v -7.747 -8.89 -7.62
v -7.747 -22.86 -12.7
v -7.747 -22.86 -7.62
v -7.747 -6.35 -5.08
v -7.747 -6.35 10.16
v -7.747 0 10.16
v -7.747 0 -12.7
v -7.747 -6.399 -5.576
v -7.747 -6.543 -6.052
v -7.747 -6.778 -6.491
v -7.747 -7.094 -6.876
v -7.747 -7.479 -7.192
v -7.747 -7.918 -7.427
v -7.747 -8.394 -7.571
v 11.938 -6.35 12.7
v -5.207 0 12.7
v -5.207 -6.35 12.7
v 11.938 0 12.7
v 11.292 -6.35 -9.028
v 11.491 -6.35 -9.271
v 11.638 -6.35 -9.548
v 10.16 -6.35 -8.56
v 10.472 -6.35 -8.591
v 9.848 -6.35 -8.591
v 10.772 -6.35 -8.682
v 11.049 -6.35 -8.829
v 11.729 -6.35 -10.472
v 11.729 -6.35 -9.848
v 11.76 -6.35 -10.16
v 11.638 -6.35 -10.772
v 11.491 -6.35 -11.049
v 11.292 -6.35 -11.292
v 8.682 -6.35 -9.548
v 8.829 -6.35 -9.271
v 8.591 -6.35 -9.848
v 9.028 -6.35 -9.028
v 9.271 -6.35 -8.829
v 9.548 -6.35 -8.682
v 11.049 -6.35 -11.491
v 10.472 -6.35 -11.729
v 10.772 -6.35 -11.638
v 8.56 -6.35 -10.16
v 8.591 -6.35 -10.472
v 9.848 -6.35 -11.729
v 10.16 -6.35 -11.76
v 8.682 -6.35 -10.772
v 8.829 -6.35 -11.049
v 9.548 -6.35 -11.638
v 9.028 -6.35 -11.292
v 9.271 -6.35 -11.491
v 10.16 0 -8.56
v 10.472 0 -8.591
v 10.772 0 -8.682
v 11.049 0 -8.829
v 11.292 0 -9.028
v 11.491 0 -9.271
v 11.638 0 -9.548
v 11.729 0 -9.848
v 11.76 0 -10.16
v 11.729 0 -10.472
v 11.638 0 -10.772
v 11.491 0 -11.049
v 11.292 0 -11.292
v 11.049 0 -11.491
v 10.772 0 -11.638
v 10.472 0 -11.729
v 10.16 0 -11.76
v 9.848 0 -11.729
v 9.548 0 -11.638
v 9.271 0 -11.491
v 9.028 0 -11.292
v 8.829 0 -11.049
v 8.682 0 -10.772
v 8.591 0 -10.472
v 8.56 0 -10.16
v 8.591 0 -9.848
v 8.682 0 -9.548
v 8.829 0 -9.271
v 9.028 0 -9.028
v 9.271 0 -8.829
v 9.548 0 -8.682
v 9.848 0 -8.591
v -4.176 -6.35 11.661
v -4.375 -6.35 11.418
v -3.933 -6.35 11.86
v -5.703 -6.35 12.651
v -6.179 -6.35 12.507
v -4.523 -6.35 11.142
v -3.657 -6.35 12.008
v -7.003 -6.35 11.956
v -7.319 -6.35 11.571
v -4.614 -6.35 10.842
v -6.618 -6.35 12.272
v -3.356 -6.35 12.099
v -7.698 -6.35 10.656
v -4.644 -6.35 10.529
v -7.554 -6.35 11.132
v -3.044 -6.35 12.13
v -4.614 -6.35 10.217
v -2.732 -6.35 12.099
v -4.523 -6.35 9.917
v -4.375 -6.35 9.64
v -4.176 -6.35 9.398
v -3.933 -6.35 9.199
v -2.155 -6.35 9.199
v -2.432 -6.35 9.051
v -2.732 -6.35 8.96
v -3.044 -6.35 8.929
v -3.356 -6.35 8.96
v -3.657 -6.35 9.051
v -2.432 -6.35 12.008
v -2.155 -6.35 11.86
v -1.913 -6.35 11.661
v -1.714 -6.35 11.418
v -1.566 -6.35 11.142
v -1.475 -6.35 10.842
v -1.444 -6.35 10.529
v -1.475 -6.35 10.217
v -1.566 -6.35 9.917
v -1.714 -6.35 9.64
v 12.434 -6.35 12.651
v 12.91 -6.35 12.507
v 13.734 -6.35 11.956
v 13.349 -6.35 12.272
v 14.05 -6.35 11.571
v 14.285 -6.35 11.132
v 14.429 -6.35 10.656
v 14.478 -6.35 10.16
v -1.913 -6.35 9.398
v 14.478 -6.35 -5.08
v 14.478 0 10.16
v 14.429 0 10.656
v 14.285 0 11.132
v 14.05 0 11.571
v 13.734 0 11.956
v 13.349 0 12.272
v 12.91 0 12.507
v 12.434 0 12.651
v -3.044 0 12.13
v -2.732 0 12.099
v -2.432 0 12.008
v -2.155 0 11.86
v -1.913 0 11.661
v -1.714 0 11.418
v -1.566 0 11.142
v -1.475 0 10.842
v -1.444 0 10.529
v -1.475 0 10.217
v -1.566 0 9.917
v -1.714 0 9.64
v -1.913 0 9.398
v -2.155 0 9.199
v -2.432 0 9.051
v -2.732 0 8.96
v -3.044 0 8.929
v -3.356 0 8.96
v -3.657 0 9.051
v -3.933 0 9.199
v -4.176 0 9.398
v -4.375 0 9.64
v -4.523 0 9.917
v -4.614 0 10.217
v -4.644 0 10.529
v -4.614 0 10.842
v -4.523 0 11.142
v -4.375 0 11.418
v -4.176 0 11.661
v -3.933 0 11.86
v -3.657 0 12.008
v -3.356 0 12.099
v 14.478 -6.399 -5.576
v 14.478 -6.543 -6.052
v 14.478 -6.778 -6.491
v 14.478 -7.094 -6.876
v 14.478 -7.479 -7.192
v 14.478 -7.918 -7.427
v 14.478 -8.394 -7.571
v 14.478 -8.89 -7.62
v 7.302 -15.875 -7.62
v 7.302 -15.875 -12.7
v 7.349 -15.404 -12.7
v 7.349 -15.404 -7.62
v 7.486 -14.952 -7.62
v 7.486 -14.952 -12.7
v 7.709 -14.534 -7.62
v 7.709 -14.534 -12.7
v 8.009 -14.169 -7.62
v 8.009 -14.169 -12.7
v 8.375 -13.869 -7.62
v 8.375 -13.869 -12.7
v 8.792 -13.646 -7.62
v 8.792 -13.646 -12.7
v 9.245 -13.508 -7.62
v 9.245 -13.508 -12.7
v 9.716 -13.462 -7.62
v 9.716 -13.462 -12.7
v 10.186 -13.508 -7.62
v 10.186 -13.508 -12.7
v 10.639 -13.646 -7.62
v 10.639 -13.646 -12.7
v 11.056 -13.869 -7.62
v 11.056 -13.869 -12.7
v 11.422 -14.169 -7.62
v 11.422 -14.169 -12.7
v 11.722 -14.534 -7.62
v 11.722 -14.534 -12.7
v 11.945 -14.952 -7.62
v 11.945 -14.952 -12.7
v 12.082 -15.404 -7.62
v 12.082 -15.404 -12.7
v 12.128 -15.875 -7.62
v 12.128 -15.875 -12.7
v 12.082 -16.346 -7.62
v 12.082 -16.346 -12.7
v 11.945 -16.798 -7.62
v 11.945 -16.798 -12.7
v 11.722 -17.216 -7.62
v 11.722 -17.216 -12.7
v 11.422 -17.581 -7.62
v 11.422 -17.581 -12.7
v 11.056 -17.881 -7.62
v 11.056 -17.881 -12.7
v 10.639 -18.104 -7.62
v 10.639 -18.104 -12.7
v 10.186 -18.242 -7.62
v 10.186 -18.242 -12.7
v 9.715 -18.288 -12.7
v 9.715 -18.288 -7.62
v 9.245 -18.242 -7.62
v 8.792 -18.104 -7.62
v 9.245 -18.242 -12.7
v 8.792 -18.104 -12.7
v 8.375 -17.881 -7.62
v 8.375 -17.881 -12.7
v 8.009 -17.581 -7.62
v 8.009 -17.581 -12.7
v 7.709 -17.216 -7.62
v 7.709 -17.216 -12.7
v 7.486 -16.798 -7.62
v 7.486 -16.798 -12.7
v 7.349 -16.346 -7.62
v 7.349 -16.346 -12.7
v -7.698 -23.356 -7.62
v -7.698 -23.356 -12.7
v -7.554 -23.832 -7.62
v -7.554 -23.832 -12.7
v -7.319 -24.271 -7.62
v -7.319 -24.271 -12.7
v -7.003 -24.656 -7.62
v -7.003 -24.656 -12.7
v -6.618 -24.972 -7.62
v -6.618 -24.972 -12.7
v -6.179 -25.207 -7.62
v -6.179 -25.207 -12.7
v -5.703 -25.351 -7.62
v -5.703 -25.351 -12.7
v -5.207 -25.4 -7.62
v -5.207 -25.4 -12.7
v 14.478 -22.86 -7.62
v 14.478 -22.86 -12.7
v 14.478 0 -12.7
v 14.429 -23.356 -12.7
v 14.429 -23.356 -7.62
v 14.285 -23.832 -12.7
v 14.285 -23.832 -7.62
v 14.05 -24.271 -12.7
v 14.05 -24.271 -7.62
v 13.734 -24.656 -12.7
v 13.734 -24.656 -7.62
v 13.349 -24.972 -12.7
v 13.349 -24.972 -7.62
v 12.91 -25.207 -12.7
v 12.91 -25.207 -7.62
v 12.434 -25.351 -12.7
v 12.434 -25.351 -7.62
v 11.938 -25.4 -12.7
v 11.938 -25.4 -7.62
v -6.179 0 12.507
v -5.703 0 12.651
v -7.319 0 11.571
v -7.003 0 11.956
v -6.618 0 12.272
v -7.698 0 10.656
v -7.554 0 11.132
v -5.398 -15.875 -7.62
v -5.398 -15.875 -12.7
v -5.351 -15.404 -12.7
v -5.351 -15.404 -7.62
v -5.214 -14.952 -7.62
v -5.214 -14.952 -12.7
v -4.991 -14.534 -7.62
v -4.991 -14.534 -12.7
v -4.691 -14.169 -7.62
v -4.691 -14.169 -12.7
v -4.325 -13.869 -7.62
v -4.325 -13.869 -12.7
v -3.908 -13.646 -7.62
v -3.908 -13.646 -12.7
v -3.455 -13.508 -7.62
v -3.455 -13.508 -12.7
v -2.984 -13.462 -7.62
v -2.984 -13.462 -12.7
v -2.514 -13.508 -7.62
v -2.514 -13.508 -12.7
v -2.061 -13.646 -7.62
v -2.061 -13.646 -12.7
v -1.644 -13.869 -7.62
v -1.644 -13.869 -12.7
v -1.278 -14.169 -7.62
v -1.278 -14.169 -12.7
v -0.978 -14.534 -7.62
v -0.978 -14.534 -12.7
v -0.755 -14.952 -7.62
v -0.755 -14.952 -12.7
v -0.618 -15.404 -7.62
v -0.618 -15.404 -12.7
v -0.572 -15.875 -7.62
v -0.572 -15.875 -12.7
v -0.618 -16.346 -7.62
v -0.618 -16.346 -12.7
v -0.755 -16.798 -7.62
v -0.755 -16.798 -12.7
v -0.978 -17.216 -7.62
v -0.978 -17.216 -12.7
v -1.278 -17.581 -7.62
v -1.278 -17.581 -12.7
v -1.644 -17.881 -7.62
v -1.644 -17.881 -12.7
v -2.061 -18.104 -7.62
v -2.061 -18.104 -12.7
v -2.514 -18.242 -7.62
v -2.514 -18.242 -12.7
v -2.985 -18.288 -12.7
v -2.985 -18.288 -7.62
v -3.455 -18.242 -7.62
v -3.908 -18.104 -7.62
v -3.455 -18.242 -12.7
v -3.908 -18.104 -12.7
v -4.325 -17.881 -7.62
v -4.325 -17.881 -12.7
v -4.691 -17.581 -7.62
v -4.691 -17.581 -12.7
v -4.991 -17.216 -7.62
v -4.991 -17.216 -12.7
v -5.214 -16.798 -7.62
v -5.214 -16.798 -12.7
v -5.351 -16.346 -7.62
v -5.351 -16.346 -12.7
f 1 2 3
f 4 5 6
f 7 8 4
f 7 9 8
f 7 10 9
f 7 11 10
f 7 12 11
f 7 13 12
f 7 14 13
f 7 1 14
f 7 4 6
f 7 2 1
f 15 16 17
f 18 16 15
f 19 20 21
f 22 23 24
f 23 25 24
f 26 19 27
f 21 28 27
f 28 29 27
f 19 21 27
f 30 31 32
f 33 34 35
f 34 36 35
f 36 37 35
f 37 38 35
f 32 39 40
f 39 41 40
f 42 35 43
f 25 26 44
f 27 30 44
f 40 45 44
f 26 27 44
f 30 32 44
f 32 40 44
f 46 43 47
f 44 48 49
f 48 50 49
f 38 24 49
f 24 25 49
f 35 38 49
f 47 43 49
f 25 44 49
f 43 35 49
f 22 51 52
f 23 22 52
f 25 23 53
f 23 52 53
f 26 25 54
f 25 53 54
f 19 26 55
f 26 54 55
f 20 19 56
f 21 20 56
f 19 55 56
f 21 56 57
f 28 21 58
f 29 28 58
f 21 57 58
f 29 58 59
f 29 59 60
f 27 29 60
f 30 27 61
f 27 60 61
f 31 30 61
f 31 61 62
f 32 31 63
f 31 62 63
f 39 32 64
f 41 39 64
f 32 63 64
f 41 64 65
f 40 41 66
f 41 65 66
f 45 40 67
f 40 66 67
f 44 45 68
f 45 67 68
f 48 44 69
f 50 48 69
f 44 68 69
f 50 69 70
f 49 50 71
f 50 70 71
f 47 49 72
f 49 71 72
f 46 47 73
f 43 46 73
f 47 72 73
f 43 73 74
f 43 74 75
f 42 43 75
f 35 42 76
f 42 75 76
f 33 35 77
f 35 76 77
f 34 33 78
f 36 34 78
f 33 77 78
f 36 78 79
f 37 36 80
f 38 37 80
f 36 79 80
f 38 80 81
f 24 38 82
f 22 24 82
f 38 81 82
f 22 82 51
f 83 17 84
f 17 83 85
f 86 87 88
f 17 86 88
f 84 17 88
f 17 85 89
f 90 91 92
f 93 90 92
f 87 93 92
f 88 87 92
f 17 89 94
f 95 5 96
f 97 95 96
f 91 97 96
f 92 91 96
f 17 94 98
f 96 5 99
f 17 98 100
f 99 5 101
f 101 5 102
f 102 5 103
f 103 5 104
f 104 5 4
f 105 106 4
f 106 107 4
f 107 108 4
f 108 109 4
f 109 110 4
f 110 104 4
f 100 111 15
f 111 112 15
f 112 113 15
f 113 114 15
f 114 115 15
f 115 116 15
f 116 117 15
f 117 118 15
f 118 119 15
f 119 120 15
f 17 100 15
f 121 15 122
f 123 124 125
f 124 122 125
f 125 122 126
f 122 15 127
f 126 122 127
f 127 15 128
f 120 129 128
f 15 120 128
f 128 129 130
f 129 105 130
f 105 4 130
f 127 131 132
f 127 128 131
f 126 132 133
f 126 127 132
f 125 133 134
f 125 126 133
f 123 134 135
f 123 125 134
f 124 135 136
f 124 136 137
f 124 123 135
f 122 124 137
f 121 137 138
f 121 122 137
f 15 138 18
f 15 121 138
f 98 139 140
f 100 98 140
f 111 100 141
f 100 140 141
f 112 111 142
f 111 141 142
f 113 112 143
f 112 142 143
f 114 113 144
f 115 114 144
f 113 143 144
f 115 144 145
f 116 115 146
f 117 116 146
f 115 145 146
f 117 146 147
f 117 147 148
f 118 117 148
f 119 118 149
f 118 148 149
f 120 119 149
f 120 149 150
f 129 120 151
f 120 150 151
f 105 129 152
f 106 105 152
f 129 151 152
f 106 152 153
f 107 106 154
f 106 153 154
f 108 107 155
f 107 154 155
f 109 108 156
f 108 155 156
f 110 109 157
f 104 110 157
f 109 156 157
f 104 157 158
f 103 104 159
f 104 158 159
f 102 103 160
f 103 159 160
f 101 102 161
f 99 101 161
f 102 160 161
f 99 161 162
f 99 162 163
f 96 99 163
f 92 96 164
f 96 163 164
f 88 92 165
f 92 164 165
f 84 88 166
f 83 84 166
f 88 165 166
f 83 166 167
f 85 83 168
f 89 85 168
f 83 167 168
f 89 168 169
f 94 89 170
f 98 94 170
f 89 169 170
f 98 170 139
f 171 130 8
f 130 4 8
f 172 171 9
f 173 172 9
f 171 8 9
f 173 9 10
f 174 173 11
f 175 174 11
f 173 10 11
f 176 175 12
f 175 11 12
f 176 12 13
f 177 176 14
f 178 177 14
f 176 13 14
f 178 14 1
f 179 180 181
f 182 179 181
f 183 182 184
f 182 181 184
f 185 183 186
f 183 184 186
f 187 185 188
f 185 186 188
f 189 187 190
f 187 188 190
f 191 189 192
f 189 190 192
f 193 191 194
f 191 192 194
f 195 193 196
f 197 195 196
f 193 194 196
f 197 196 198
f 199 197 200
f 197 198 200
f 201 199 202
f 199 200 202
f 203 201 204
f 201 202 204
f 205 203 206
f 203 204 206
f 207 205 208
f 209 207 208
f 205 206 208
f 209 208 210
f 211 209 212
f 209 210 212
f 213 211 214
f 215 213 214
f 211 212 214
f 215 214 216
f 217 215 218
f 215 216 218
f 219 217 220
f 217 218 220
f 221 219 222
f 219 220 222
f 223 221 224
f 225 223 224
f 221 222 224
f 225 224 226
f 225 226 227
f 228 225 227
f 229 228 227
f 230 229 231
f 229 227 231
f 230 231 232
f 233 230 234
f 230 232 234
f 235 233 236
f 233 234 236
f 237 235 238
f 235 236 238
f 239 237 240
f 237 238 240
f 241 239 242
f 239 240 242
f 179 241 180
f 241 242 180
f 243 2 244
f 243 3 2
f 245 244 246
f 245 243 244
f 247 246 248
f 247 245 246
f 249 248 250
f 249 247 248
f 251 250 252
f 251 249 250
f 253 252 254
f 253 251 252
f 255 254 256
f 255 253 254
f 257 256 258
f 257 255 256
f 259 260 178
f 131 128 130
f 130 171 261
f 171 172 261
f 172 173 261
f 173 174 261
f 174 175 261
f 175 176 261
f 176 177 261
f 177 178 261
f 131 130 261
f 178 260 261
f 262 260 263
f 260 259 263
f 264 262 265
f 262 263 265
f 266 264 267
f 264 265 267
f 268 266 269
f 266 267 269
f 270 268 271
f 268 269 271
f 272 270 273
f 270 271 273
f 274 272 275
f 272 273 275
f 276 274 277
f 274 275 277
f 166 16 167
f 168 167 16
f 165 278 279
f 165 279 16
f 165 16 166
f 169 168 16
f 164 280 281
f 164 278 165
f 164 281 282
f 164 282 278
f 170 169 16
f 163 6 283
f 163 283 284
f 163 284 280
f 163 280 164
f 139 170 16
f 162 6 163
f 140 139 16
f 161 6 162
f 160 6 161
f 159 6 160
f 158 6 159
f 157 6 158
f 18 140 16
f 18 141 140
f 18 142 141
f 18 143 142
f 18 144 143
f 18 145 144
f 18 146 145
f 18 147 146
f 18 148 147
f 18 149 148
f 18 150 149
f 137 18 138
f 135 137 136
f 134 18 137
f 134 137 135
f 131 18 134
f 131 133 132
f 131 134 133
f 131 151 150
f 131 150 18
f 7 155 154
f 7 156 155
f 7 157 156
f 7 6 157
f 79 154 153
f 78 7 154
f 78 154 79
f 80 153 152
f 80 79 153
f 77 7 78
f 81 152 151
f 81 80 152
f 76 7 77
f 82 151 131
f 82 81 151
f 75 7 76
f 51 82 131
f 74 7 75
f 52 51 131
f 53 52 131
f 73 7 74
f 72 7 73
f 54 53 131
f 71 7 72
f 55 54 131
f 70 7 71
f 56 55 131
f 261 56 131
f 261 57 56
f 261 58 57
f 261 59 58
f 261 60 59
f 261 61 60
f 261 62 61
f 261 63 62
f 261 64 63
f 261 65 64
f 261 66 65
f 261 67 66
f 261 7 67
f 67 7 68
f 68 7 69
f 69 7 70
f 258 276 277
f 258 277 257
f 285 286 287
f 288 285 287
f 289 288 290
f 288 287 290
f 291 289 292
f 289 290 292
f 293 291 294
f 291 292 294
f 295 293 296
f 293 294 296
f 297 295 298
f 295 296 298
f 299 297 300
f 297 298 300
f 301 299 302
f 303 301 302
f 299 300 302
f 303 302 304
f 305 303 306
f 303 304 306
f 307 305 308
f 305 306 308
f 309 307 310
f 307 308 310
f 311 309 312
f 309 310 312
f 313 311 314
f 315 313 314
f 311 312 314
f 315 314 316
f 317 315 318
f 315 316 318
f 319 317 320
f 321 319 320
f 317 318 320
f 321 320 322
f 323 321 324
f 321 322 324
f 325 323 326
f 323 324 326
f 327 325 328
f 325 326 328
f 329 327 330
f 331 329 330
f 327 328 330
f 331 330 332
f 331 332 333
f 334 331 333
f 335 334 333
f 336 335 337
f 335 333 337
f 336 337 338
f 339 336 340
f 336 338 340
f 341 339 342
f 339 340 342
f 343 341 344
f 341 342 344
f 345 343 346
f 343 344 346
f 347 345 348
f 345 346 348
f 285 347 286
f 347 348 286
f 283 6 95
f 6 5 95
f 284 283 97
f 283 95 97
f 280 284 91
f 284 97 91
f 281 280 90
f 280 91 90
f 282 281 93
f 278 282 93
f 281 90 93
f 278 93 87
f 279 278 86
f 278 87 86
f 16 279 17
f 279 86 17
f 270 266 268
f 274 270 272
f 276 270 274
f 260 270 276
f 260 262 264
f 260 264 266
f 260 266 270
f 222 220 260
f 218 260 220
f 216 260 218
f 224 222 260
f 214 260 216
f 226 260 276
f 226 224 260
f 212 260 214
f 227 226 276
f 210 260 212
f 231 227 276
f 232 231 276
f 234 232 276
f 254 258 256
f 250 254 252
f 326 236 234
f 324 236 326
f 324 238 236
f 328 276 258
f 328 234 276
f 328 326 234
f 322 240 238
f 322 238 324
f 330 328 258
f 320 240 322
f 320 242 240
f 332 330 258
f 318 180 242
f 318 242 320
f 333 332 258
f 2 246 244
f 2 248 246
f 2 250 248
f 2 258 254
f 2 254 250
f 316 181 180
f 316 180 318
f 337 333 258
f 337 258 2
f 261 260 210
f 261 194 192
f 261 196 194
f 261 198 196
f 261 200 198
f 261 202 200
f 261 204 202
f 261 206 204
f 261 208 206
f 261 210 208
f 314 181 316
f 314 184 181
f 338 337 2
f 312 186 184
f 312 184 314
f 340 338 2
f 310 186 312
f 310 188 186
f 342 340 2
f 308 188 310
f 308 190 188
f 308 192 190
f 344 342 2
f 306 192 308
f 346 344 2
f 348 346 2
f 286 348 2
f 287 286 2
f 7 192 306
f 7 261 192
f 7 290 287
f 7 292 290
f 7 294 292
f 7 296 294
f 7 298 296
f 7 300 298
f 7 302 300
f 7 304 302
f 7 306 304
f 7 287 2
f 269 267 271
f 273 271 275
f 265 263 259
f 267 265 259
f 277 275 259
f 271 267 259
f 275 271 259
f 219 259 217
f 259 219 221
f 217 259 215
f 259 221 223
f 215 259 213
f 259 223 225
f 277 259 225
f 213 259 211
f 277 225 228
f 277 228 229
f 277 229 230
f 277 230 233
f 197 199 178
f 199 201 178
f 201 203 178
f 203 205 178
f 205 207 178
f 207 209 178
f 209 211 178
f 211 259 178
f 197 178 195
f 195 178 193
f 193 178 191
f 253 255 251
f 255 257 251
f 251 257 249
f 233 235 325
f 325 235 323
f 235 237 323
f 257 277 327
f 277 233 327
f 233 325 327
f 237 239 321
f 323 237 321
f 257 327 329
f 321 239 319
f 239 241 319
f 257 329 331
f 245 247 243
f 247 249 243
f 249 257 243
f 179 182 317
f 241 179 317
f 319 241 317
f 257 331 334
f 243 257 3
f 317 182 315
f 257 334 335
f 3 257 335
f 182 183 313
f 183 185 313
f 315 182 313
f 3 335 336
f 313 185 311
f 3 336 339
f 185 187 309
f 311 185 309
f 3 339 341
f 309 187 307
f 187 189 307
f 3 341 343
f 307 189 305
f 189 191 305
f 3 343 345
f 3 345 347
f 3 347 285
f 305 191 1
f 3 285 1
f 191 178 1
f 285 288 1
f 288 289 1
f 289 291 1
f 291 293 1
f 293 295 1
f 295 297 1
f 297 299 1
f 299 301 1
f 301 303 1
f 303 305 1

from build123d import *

# Parameters (mm, degrees)
SKETCH1_W           = 22.225
SKETCH1_H           = 25.4
SKETCH1_R           = 1.6002
BOSS_EXTRUDE1_DEPTH = 6.35
SKETCH2_W           = 22.225
SKETCH2_H           = 19.05
SKETCH2_R           = 2.413
BOSS_EXTRUDE2_DEPTH = 5.08
FILLET1_R           = 2.54


with BuildPart() as part:
    # Sketch1 → Boss-Extrude1 (new body)
    with BuildSketch(Plane(origin=(0, 0, 0), x_dir=(1, 0, 0), z_dir=(0, 1, 0))):
        with Locations((3.3655, 0)):
            Rectangle(SKETCH1_W, SKETCH1_H)
        with Locations(Location((10.16, 10.16, 0), (0, 0, 270))):
            Circle(SKETCH1_R, mode=Mode.SUBTRACT)
        with Locations(Location((-3.044225571, -10.529380079, 0), (0, 0, 270))):
            Circle(SKETCH1_R, mode=Mode.SUBTRACT)
    extrude(amount=-BOSS_EXTRUDE1_DEPTH)

    # Sketch2 → Boss-Extrude2 (add)
    with BuildSketch(Plane(origin=(0, 0, -12.7), x_dir=(-1, 0, 0), z_dir=(0, 0, -1))):
        with Locations((-3.3655, -15.875)):
            Rectangle(SKETCH2_W, SKETCH2_H)
        with Locations((-9.7155, -15.875)):
            Circle(SKETCH2_R, mode=Mode.SUBTRACT)
        with Locations((2.9845, -15.875)):
            Circle(SKETCH2_R, mode=Mode.SUBTRACT)
    extrude(amount=-BOSS_EXTRUDE2_DEPTH)

    # Fillet1
    fillet1_edges = [part.edges().sort_by_distance(p)[0] for p in [
        (3.3655, -6.35, -7.62),
        (14.478, -25.4, -10.16),
        (-7.747, -25.4, -10.16),
        (14.478, -3.175, 12.7),
        (-7.747, -3.175, 12.7),
    ]]
    fillet(fillet1_edges, radius=FILLET1_R)


solid = part.part
